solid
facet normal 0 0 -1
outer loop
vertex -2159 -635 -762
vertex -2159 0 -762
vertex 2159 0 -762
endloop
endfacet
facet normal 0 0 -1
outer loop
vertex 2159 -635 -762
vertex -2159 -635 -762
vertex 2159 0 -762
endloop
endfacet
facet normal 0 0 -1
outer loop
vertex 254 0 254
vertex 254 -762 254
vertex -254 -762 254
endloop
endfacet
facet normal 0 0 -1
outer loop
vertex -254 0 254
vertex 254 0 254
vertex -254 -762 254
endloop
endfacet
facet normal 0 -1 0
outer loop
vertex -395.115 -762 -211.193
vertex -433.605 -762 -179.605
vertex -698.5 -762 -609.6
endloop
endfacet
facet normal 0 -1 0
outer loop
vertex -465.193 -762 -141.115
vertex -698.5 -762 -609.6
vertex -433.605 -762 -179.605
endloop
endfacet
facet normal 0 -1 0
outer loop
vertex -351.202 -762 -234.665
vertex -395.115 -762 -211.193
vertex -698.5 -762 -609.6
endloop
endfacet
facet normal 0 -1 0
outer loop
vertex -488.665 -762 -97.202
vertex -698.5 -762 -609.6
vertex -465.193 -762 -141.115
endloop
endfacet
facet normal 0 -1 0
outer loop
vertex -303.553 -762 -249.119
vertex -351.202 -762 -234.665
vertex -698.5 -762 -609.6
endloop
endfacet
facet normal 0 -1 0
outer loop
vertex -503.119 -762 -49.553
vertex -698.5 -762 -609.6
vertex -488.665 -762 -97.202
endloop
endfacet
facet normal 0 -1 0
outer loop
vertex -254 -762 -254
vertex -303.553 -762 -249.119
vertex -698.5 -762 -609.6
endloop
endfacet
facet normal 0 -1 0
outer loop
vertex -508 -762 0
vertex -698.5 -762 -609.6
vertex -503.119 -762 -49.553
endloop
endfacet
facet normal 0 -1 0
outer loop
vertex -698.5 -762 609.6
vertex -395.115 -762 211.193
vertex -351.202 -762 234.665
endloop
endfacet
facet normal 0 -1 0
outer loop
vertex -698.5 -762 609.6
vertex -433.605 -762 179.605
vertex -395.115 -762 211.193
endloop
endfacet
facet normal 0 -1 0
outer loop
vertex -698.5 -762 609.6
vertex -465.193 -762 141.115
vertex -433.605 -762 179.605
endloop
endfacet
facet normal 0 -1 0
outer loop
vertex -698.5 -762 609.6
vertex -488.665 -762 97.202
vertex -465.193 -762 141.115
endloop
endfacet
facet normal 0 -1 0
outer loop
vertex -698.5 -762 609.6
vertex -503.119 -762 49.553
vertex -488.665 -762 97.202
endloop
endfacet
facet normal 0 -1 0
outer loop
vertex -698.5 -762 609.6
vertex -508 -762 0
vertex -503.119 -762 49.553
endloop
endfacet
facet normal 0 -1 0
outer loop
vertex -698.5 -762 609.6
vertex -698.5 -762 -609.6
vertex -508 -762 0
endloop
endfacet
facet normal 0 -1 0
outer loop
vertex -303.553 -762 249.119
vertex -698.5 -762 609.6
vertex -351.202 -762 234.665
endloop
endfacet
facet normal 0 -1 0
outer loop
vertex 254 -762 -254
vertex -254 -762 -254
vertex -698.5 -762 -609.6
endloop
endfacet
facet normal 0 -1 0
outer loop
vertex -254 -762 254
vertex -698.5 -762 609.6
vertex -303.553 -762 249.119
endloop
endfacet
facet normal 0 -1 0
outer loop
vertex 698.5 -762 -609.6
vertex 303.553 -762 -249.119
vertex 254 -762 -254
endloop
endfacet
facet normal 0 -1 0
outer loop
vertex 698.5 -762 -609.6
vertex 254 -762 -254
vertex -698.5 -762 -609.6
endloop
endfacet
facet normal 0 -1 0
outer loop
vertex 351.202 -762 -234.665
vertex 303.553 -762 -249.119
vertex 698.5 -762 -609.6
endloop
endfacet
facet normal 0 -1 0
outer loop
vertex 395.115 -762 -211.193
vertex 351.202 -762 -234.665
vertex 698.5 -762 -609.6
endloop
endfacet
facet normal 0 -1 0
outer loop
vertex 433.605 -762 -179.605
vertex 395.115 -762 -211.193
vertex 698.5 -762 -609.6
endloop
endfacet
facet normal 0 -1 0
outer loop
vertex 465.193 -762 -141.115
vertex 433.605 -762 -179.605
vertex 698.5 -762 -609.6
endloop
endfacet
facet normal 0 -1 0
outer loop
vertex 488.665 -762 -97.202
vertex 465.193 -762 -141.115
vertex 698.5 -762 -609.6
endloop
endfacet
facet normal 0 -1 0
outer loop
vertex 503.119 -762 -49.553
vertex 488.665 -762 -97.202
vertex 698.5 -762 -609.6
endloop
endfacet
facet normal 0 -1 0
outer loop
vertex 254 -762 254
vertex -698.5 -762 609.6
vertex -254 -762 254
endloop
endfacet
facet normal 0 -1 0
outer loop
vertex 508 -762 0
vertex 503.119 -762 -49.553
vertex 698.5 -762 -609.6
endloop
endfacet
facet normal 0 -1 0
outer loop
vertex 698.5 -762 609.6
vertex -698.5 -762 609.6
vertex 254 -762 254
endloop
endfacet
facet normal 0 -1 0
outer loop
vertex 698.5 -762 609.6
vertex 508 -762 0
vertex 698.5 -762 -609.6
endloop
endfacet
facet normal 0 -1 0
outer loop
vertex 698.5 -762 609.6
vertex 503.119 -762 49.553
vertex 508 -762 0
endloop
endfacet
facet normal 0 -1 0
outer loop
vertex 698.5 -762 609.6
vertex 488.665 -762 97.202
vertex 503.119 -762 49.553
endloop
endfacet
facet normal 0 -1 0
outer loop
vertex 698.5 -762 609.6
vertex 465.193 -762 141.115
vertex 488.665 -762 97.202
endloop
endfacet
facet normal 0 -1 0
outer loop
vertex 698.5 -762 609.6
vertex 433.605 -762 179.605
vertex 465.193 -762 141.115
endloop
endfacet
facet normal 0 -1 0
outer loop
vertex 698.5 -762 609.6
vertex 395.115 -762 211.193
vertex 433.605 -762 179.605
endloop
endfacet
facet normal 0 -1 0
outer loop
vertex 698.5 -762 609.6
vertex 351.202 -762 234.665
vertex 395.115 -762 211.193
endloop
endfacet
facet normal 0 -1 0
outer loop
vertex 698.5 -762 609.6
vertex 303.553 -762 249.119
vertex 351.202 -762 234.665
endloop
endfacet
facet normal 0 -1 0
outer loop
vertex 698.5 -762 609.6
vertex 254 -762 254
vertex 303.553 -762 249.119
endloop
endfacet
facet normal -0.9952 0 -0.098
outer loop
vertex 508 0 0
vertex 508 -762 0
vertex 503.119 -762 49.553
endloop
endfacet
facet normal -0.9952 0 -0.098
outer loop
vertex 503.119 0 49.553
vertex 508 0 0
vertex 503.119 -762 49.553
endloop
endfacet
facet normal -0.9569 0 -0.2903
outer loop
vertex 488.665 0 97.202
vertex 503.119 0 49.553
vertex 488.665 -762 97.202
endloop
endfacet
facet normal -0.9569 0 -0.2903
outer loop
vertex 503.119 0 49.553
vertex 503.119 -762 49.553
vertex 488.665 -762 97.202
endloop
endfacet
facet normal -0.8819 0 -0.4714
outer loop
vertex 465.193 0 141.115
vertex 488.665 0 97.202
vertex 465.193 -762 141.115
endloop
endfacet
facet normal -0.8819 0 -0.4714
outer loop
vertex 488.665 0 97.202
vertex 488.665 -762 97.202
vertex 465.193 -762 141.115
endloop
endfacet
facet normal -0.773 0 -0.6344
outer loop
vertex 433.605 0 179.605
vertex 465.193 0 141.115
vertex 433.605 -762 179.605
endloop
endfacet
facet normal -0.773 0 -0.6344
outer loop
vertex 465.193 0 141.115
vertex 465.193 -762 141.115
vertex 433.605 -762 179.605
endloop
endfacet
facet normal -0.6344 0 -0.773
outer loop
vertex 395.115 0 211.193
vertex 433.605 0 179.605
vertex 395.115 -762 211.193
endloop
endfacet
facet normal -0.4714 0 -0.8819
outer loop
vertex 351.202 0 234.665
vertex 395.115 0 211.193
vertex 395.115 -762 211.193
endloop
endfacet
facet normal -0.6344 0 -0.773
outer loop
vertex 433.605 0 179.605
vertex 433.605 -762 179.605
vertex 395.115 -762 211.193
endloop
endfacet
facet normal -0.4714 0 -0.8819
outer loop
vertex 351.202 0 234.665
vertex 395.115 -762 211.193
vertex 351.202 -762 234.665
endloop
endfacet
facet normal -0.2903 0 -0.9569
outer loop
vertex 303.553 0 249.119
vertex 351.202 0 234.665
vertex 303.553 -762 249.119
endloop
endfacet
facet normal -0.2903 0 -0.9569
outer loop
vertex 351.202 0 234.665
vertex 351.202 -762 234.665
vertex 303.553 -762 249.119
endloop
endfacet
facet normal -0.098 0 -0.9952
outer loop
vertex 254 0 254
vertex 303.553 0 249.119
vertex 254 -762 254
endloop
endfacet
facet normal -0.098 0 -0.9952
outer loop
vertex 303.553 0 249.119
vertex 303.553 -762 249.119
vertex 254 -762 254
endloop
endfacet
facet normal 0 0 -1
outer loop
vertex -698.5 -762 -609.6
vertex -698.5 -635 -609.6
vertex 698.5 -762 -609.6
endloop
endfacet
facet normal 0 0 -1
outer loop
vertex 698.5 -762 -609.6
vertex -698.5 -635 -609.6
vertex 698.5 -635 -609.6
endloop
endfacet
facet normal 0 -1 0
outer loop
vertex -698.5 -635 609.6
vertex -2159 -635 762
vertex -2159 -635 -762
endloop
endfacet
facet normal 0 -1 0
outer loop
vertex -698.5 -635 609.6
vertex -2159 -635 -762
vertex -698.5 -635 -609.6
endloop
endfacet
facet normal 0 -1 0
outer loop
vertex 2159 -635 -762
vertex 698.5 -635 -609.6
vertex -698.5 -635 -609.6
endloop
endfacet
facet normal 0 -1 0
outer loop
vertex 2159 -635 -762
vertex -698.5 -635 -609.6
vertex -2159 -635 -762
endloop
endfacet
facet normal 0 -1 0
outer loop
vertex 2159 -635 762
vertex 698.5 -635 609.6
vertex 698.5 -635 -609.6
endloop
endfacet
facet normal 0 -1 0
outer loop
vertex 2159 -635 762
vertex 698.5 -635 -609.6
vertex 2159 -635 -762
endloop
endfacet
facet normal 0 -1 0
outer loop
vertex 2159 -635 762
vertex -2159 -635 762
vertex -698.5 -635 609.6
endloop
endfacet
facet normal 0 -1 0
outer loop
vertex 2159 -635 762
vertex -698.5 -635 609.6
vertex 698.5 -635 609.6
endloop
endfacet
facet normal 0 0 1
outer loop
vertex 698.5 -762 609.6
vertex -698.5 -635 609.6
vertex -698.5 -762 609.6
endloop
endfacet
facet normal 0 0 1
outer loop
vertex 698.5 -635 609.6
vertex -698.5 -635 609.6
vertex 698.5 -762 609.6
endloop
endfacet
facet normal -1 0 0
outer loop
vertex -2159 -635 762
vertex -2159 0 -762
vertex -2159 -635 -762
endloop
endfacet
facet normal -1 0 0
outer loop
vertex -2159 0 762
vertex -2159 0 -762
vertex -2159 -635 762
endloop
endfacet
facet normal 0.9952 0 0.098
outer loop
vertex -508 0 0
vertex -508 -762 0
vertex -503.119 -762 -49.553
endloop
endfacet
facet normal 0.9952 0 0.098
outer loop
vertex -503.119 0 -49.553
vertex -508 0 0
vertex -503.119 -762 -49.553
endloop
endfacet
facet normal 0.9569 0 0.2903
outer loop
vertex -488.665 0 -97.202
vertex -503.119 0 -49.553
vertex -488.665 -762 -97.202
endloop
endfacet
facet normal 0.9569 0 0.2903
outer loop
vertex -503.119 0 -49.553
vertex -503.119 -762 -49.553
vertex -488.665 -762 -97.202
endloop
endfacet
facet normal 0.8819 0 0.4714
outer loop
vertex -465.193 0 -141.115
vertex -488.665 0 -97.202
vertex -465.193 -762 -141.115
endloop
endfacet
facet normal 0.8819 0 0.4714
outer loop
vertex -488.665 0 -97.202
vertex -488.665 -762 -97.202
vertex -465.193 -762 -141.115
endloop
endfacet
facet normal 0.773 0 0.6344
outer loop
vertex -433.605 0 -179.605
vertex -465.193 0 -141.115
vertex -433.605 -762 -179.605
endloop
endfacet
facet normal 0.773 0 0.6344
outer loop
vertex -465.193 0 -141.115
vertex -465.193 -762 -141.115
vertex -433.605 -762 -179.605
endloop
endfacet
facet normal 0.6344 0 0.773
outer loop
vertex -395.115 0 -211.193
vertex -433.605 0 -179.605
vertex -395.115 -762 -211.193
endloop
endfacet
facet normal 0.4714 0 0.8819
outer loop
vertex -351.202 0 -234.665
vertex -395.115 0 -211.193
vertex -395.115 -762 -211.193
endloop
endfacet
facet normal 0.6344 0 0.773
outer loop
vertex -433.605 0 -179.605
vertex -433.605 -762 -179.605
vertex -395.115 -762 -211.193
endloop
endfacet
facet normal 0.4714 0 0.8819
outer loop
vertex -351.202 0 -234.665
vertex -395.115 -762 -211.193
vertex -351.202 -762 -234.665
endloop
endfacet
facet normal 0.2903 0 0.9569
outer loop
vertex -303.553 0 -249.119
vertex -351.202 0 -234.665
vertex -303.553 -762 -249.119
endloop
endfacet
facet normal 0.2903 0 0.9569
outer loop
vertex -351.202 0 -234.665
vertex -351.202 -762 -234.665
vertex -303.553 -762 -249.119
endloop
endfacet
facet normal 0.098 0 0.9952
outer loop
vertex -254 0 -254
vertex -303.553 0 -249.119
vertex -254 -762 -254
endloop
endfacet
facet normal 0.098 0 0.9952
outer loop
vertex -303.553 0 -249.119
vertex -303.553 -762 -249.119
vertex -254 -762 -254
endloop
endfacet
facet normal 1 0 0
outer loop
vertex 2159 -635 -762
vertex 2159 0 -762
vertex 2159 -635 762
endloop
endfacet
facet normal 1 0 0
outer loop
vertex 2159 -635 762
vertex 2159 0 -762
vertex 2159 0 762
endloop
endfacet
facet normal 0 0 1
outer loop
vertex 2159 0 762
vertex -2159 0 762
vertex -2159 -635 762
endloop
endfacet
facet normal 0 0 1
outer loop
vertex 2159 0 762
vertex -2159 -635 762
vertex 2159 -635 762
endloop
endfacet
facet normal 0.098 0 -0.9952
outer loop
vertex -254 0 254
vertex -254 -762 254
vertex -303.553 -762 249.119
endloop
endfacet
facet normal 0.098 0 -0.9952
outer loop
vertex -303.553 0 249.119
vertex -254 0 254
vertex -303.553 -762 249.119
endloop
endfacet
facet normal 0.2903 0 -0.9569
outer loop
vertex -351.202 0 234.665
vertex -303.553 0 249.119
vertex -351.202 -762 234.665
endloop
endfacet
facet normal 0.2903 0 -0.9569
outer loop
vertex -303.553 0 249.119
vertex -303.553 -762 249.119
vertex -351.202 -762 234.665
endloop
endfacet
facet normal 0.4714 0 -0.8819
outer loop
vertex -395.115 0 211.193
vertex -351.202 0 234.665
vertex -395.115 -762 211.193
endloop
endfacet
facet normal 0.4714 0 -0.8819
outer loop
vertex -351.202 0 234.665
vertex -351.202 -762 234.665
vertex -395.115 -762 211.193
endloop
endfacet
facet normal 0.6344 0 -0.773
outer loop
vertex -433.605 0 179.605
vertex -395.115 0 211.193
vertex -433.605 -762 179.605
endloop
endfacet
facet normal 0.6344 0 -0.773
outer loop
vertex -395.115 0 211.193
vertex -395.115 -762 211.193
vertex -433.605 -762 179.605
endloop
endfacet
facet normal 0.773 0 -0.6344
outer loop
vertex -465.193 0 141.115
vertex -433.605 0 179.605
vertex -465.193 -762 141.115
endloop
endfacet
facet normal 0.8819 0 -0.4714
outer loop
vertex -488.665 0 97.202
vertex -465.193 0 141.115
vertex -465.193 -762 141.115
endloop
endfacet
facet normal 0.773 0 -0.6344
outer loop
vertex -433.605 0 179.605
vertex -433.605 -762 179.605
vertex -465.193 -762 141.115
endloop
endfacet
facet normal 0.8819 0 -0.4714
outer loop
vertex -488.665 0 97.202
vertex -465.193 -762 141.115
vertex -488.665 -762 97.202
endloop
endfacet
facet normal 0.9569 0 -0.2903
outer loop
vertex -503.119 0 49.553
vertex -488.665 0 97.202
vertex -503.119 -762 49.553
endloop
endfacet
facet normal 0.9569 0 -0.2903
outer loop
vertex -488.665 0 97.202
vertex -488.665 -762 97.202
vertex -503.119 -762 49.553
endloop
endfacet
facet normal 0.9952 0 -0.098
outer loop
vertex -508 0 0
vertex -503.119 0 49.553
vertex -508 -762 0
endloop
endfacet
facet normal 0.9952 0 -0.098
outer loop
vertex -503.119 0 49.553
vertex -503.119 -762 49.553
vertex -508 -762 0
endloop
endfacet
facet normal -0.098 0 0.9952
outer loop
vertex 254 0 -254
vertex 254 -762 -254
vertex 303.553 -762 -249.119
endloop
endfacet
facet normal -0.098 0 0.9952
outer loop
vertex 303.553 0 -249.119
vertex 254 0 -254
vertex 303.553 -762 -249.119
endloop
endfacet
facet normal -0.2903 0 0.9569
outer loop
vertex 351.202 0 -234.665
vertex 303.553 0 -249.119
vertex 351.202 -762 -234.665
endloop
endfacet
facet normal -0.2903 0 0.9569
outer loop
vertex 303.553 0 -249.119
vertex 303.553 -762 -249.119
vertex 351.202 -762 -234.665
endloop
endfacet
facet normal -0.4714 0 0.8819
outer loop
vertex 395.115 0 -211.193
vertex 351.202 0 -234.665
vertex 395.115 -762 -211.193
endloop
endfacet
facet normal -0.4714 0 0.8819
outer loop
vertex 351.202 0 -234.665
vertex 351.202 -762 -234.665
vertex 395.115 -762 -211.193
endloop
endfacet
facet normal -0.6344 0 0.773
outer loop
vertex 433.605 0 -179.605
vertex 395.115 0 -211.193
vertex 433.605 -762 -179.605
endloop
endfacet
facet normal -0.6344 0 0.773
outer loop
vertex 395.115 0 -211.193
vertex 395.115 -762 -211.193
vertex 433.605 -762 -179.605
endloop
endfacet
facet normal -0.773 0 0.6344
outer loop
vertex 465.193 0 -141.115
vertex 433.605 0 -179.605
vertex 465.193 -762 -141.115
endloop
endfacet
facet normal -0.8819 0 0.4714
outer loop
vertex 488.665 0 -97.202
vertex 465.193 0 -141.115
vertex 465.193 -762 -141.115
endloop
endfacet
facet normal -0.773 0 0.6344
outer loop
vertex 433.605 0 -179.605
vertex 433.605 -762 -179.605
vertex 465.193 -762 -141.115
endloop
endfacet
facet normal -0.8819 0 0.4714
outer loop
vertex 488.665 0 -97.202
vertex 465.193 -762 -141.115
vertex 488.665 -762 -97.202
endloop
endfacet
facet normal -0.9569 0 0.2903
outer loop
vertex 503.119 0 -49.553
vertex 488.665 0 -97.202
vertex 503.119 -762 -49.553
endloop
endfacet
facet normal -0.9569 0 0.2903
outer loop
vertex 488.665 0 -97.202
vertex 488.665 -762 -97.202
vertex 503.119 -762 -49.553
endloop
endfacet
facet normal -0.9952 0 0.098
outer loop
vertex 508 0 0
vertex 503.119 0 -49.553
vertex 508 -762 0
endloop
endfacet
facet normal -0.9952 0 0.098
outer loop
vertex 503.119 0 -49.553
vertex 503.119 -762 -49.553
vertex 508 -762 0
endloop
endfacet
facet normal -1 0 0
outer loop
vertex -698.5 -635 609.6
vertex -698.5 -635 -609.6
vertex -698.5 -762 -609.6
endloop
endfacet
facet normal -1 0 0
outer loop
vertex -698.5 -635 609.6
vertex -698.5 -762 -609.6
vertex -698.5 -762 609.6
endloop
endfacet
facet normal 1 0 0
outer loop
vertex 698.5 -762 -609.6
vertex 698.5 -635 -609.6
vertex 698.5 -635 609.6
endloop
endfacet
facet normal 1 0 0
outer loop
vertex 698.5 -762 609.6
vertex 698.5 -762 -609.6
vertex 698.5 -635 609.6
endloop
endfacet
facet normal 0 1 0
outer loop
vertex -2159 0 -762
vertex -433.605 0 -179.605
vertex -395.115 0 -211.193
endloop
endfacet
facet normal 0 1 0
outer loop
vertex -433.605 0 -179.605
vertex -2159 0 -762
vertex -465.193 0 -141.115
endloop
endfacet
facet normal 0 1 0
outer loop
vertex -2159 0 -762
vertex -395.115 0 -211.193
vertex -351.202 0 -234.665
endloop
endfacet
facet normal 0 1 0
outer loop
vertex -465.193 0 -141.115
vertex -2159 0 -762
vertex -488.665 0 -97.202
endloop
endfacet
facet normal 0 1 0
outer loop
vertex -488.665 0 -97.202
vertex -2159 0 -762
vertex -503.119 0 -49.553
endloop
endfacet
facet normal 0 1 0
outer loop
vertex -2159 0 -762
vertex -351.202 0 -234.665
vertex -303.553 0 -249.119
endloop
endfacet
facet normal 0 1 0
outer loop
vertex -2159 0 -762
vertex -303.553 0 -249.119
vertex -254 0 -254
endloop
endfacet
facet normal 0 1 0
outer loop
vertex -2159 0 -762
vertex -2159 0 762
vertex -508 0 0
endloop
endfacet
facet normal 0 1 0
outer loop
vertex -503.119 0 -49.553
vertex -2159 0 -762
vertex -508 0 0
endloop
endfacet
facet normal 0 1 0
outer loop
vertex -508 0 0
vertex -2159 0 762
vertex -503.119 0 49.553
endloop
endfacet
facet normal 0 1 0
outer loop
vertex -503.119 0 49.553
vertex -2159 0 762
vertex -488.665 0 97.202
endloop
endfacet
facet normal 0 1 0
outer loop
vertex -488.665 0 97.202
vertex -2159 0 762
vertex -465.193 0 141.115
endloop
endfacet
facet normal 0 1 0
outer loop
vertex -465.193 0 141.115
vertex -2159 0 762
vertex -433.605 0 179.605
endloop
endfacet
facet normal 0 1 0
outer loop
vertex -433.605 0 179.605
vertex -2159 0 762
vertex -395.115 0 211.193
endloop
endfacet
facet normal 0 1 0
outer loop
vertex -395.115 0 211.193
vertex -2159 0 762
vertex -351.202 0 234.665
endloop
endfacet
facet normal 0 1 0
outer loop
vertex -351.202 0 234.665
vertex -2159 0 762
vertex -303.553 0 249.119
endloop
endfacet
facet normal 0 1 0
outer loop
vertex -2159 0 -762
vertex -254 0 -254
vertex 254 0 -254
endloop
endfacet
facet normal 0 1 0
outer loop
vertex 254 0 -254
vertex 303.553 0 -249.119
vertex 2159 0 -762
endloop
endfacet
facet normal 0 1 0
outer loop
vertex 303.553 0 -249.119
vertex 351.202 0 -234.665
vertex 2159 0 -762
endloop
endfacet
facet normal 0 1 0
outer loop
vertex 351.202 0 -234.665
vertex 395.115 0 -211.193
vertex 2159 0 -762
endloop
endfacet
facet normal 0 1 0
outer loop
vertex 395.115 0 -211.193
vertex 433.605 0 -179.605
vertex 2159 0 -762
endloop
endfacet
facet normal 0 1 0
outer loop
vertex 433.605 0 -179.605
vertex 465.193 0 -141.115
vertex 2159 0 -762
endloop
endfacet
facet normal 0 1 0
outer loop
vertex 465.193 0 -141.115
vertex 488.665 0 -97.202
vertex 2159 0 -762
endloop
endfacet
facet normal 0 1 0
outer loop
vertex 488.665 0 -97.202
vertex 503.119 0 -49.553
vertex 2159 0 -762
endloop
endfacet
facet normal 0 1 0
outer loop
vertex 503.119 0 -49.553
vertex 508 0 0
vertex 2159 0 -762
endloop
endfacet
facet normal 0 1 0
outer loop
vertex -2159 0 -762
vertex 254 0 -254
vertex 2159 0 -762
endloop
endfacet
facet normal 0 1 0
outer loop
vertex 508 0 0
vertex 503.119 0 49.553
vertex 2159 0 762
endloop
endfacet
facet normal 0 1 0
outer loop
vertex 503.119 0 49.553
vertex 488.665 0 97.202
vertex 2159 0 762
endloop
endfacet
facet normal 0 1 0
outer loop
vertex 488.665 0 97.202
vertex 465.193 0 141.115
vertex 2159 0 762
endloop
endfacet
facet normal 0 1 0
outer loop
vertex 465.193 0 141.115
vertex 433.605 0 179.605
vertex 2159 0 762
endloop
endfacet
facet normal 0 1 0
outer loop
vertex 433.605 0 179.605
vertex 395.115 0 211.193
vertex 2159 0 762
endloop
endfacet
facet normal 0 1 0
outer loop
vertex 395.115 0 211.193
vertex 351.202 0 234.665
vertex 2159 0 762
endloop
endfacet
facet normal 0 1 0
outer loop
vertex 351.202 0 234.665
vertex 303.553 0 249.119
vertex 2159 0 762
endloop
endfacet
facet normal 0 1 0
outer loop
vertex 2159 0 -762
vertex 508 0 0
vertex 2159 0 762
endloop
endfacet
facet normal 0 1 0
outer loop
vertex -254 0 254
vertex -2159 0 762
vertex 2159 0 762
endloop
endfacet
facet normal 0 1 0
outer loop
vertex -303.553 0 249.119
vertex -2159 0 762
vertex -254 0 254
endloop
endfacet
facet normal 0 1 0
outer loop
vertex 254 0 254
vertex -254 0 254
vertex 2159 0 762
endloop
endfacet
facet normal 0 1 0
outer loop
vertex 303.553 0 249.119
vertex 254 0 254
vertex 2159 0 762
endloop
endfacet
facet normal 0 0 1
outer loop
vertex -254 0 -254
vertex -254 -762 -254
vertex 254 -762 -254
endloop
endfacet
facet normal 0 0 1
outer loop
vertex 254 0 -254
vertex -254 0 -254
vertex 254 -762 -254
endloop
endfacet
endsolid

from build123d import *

# Parameters (mm, degrees)
F0_W     = 4318
F0_H     = 1524
F1_DEPTH = 635
F2_W     = 1397
F2_H     = 1219.2
F3_DEPTH = 127
F5_DEPTH = 762.001


with BuildPart() as f1:
    # F0 (on Front) → F1 (new body)
    with BuildSketch(Plane.XZ):
        Rectangle(F0_W, F0_H)
    extrude(amount=F1_DEPTH)

    # F2 (on face) → F3 (join)
    with BuildSketch(Plane.XZ.offset(635)):
        Rectangle(F2_W, F2_H)
    extrude(amount=F3_DEPTH)

    # F4 (on face) → F5 (cut, through all)
    with BuildSketch(Plane.XZ.offset(762)):
        with BuildLine():
            Line((-254, -254), (254, -254))
            ThreePointArc((254, -254), (433.605122, -179.605122), (508, 0))
            ThreePointArc((508, 0), (433.605122, 179.605122), (254, 254))
            Line((254, 254), (-254, 254))
            ThreePointArc((-254, 254), (-433.605122, 179.605122), (-508, 0))
            ThreePointArc((-508, 0), (-433.605122, -179.605122), (-254, -254))
        make_face()
    extrude(amount=-F5_DEPTH, mode=Mode.SUBTRACT)


solid = f1.part
